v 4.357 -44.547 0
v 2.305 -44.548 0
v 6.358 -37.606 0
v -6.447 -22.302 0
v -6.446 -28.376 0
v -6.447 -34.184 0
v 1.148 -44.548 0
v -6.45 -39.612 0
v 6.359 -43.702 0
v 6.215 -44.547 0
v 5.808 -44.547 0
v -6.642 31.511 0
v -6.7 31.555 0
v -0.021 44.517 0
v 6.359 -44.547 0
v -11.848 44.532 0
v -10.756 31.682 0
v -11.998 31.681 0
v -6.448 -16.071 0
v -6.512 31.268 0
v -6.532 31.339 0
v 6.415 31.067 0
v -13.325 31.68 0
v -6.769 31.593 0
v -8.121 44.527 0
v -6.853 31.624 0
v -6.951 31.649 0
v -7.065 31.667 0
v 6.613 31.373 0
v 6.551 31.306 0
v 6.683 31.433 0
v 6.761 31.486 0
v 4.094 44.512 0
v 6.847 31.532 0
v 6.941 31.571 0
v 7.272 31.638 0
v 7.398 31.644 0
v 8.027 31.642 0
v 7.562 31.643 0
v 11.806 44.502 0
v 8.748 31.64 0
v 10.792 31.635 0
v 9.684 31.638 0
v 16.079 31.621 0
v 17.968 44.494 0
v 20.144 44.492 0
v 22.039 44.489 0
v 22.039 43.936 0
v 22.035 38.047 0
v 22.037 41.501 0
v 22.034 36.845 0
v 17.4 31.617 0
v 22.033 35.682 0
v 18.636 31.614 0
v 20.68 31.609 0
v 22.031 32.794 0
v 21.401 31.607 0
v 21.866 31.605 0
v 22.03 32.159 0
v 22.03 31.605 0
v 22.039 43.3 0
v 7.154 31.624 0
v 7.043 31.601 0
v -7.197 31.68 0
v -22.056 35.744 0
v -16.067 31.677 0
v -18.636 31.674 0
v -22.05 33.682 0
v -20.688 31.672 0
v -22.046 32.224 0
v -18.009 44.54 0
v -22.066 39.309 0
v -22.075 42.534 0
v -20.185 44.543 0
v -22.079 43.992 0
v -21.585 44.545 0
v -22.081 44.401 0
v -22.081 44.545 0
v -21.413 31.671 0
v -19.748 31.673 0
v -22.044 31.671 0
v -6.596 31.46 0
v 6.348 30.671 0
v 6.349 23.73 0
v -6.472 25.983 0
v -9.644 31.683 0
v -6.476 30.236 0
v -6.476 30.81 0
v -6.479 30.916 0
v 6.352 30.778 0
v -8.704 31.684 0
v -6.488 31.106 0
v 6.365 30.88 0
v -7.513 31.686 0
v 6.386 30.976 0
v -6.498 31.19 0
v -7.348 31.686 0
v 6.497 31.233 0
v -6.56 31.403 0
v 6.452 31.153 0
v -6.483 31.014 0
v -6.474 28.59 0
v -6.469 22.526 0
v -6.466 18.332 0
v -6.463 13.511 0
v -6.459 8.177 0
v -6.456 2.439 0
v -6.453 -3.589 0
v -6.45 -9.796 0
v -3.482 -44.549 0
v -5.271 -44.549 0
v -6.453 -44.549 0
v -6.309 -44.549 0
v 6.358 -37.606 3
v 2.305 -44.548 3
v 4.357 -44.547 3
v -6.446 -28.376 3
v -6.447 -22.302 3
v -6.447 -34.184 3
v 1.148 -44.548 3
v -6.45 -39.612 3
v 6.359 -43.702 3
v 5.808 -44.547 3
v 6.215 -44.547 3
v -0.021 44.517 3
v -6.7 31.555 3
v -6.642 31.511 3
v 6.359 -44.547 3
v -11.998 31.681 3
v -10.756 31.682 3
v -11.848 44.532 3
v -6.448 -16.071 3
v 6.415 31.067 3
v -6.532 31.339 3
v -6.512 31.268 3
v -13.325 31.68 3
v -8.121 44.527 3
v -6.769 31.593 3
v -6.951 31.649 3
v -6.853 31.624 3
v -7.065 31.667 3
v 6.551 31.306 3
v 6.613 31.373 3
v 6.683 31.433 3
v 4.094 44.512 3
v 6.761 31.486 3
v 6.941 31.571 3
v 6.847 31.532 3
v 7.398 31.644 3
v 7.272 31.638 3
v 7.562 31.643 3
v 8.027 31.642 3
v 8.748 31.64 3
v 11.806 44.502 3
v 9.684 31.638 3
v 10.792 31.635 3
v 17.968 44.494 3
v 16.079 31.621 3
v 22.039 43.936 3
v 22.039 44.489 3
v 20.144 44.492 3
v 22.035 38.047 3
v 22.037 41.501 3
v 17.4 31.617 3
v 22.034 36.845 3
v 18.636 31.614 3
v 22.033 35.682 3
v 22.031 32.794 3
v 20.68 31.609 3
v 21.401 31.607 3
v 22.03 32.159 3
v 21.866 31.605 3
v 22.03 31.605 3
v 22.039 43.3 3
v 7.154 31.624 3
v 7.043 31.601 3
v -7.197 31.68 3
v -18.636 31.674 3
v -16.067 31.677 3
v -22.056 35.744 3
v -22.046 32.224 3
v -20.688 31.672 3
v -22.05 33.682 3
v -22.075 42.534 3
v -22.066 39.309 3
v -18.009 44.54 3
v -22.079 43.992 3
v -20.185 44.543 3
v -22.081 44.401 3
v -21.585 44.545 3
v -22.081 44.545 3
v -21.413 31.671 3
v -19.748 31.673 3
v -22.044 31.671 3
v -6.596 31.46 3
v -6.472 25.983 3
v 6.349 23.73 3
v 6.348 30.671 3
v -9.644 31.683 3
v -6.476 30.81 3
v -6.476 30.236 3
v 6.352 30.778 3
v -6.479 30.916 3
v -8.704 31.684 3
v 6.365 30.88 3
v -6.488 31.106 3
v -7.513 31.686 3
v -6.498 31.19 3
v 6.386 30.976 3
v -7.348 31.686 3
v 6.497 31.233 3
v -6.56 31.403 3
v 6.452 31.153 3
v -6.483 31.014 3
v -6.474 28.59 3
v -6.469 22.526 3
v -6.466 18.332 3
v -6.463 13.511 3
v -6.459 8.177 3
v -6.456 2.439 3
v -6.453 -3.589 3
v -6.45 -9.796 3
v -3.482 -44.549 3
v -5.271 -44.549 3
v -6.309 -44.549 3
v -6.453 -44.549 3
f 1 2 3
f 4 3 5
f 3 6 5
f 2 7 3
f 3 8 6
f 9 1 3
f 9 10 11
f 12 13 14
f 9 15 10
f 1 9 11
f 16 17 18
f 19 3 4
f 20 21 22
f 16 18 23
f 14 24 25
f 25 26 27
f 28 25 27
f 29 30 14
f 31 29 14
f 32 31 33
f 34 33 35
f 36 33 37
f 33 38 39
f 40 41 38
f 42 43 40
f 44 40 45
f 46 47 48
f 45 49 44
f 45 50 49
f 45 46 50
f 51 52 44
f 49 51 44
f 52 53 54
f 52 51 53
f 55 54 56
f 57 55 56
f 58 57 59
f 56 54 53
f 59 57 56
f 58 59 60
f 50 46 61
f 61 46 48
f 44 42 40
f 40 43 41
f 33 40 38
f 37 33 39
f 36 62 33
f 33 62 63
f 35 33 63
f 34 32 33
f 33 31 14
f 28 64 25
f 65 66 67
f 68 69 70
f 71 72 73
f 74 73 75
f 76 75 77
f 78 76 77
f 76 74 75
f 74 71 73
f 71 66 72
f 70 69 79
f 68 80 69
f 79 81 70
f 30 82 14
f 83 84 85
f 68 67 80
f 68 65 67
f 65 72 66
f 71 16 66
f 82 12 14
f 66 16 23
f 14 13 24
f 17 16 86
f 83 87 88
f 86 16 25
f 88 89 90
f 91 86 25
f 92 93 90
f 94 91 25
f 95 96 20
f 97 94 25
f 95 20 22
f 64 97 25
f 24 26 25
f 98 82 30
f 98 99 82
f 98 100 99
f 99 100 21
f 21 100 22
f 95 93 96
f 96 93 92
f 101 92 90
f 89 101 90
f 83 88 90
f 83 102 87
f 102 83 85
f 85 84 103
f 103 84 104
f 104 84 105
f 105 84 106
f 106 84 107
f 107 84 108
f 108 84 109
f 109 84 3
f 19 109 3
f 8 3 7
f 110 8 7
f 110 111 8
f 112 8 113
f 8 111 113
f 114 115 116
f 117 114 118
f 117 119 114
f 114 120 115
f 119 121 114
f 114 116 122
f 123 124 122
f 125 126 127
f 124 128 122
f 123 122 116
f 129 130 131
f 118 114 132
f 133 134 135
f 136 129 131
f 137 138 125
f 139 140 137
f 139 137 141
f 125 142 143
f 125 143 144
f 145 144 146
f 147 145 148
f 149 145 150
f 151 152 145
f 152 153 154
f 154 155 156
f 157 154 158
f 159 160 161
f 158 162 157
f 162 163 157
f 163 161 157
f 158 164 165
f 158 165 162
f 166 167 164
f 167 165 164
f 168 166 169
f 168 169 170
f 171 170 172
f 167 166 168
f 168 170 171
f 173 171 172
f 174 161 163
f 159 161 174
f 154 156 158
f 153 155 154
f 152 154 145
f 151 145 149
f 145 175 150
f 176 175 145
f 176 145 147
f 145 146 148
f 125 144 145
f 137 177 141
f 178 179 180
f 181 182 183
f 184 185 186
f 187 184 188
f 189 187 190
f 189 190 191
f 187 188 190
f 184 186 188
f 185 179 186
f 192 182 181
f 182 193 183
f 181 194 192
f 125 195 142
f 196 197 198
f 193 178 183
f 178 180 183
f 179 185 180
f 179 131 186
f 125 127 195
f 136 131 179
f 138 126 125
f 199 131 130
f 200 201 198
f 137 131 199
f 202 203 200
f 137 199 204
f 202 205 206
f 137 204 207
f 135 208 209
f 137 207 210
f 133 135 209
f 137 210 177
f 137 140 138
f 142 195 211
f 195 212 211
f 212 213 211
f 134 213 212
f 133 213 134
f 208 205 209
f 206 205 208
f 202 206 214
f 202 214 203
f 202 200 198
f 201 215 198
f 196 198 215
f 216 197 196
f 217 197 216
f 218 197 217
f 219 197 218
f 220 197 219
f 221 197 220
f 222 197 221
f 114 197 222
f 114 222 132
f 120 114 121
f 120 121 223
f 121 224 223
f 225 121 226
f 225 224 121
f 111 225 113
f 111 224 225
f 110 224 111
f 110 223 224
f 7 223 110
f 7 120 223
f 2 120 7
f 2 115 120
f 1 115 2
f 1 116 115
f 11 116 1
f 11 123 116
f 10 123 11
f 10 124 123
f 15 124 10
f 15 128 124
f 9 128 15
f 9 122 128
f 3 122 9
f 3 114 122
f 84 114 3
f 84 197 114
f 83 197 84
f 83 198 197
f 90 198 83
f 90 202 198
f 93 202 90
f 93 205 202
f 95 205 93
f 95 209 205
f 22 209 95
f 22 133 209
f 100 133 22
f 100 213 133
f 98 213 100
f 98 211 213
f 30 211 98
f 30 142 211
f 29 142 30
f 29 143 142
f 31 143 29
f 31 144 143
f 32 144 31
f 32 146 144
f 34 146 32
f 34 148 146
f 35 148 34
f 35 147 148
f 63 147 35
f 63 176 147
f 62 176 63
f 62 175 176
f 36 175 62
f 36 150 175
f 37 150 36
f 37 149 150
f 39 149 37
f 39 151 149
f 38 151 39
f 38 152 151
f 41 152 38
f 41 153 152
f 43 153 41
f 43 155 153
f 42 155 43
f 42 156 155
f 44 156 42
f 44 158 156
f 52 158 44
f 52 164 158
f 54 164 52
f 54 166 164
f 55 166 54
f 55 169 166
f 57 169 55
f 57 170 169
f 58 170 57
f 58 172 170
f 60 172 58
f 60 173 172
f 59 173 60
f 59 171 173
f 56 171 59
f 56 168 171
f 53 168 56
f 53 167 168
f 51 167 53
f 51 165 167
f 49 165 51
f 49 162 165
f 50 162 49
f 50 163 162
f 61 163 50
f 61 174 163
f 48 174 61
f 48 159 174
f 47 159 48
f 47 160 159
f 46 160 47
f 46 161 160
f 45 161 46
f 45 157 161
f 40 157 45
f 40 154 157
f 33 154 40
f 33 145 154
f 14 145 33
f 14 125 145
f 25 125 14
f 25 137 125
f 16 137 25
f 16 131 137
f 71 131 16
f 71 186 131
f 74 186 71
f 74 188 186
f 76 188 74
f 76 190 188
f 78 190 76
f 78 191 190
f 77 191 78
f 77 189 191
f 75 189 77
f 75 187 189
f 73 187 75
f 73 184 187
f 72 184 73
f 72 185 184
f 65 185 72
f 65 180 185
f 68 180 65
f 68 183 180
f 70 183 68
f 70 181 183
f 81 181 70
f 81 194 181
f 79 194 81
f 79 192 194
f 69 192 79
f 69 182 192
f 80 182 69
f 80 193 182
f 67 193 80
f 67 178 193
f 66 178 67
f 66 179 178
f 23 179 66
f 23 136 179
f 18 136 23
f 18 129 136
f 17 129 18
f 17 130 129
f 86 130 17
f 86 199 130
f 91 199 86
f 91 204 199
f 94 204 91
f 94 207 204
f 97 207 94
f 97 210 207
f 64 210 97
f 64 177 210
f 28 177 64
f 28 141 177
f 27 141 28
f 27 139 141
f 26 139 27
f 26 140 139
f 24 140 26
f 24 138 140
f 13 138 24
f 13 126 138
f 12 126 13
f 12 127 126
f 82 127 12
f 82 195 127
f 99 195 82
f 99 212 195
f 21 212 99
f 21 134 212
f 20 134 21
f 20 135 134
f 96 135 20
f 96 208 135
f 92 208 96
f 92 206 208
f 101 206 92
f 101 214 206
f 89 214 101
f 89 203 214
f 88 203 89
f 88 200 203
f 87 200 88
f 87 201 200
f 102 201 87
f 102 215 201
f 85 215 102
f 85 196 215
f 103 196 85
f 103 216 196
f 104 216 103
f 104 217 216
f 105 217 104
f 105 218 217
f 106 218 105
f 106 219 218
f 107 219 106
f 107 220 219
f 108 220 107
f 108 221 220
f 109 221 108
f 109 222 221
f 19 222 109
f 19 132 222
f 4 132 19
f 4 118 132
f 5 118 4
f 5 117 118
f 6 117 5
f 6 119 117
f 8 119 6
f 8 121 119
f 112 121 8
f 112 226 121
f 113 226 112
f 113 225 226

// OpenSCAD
// Generated from 交通部公路局（原交通部公路總局）「新式號牌使用之英文字、數字字體」author trace
fudge = 0.1;

module glyph_2012_T(h = 3) {
  difference() {
    linear_extrude(height = h)
      polygon(points = [[-22.081, 44.5453], [-22.0806, 44.4007], [-22.0794, 43.9921], [-22.0776, 43.3571], [-22.0753, 42.5336], [-22.0725, 41.5592], [-22.0694, 40.4716], [-22.0661, 39.3087], [-22.0627, 38.1079], [-22.0593, 36.9072], [-22.056, 35.7442], [-22.0529, 34.6567], [-22.0501, 33.6823], [-22.0478, 32.8588], [-22.046, 32.2238], [-22.0448, 31.8152], [-22.0444, 31.6706], [-21.8794, 31.6708], [-21.4129, 31.6713], [-20.6882, 31.672], [-19.7481, 31.673], [-18.6358, 31.6741], [-17.3943, 31.6754], [-16.0668, 31.6768], [-14.6961, 31.6782], [-13.3255, 31.6796], [-11.998, 31.681], [-10.7565, 31.6822], [-9.6442, 31.6834], [-8.7041, 31.6843], [-7.9794, 31.6851], [-7.5129, 31.6856], [-7.3479, 31.6857], [-7.1973, 31.6797], [-7.0654, 31.6675], [-6.951, 31.649], [-6.8527, 31.6242], [-6.7694, 31.593], [-6.6998, 31.5553], [-6.6425, 31.5112], [-6.5964, 31.4604], [-6.5601, 31.403], [-6.5325, 31.3389], [-6.5122, 31.268], [-6.4979, 31.1903], [-6.4885, 31.1057], [-6.4826, 31.0141], [-6.4791, 30.9156], [-6.4765, 30.8099], [-6.476, 30.2363], [-6.4745, 28.59], [-6.4723, 25.9826], [-6.4695, 22.5259], [-6.4662, 18.3316], [-6.4628, 13.5112], [-6.4592, 8.1766], [-6.4558, 2.4394], [-6.4527, -3.5887], [-6.45, -9.7961], [-6.448, -16.071], [-6.4467, -22.3017], [-6.4465, -28.3765], [-6.4474, -34.1839], [-6.4497, -39.6119], [-6.4534, -44.5491], [-6.3095, -44.5491], [-5.9029, -44.549], [-5.271, -44.5489], [-4.4515, -44.5488], [-3.4818, -44.5487], [-2.3995, -44.5485], [-1.2422, -44.5483], [-0.0473, -44.5481], [1.1476, -44.5479], [2.305, -44.5478], [3.3873, -44.5476], [4.3569, -44.5474], [5.1765, -44.5473], [5.8083, -44.5472], [6.215, -44.5472], [6.3589, -44.5471], [6.3587, -43.7024], [6.3584, -41.3151], [6.3579, -37.6056], [6.3572, -32.7942], [6.3564, -27.1014], [6.3555, -20.7475], [6.3545, -13.9529], [6.3535, -6.9379], [6.3525, 0.0771], [6.3515, 6.8717], [6.3506, 13.2256], [6.3498, 18.9185], [6.3491, 23.7298], [6.3486, 27.4393], [6.3483, 29.8266], [6.3482, 30.6713], [6.3523, 30.7779], [6.3648, 30.8797], [6.3856, 30.9763], [6.4146, 31.0674], [6.4519, 31.153], [6.4973, 31.2326], [6.551, 31.306], [6.6128, 31.3729], [6.6828, 31.4332], [6.7608, 31.4864], [6.847, 31.5323], [6.9412, 31.5708], [7.0434, 31.6014], [7.1536, 31.624], [7.2718, 31.6383], [7.3979, 31.6439], [7.5623, 31.6435], [8.0267, 31.6423], [8.7483, 31.6403], [9.6842, 31.6379], [10.7916, 31.6349], [12.0277, 31.6316], [13.3494, 31.6281], [14.714, 31.6245], [16.0787, 31.6209], [17.4004, 31.6173], [18.6364, 31.6141], [19.7439, 31.6111], [20.6798, 31.6086], [21.4014, 31.6067], [21.8658, 31.6055], [22.0301, 31.605], [22.0302, 31.7497], [22.0305, 32.1586], [22.031, 32.7941], [22.0316, 33.6182], [22.0323, 34.5933], [22.0331, 35.6817], [22.034, 36.8455], [22.0348, 38.0472], [22.0357, 39.2488], [22.0366, 40.4126], [22.0374, 41.501], [22.0381, 42.4761], [22.0387, 43.3002], [22.0391, 43.9357], [22.0394, 44.3446], [22.0395, 44.4893], [21.544, 44.4899], [20.1437, 44.4917], [17.9679, 44.4944], [15.1457, 44.498], [11.8065, 44.5023], [8.0795, 44.507], [4.094, 44.512], [-0.0207, 44.5173], [-4.1355, 44.5225], [-8.121, 44.5275], [-11.8479, 44.5323], [-15.1871, 44.5365], [-18.0093, 44.5401], [-20.1852, 44.5429], [-21.5855, 44.5446]]);
  }
}

glyph_2012_T();
